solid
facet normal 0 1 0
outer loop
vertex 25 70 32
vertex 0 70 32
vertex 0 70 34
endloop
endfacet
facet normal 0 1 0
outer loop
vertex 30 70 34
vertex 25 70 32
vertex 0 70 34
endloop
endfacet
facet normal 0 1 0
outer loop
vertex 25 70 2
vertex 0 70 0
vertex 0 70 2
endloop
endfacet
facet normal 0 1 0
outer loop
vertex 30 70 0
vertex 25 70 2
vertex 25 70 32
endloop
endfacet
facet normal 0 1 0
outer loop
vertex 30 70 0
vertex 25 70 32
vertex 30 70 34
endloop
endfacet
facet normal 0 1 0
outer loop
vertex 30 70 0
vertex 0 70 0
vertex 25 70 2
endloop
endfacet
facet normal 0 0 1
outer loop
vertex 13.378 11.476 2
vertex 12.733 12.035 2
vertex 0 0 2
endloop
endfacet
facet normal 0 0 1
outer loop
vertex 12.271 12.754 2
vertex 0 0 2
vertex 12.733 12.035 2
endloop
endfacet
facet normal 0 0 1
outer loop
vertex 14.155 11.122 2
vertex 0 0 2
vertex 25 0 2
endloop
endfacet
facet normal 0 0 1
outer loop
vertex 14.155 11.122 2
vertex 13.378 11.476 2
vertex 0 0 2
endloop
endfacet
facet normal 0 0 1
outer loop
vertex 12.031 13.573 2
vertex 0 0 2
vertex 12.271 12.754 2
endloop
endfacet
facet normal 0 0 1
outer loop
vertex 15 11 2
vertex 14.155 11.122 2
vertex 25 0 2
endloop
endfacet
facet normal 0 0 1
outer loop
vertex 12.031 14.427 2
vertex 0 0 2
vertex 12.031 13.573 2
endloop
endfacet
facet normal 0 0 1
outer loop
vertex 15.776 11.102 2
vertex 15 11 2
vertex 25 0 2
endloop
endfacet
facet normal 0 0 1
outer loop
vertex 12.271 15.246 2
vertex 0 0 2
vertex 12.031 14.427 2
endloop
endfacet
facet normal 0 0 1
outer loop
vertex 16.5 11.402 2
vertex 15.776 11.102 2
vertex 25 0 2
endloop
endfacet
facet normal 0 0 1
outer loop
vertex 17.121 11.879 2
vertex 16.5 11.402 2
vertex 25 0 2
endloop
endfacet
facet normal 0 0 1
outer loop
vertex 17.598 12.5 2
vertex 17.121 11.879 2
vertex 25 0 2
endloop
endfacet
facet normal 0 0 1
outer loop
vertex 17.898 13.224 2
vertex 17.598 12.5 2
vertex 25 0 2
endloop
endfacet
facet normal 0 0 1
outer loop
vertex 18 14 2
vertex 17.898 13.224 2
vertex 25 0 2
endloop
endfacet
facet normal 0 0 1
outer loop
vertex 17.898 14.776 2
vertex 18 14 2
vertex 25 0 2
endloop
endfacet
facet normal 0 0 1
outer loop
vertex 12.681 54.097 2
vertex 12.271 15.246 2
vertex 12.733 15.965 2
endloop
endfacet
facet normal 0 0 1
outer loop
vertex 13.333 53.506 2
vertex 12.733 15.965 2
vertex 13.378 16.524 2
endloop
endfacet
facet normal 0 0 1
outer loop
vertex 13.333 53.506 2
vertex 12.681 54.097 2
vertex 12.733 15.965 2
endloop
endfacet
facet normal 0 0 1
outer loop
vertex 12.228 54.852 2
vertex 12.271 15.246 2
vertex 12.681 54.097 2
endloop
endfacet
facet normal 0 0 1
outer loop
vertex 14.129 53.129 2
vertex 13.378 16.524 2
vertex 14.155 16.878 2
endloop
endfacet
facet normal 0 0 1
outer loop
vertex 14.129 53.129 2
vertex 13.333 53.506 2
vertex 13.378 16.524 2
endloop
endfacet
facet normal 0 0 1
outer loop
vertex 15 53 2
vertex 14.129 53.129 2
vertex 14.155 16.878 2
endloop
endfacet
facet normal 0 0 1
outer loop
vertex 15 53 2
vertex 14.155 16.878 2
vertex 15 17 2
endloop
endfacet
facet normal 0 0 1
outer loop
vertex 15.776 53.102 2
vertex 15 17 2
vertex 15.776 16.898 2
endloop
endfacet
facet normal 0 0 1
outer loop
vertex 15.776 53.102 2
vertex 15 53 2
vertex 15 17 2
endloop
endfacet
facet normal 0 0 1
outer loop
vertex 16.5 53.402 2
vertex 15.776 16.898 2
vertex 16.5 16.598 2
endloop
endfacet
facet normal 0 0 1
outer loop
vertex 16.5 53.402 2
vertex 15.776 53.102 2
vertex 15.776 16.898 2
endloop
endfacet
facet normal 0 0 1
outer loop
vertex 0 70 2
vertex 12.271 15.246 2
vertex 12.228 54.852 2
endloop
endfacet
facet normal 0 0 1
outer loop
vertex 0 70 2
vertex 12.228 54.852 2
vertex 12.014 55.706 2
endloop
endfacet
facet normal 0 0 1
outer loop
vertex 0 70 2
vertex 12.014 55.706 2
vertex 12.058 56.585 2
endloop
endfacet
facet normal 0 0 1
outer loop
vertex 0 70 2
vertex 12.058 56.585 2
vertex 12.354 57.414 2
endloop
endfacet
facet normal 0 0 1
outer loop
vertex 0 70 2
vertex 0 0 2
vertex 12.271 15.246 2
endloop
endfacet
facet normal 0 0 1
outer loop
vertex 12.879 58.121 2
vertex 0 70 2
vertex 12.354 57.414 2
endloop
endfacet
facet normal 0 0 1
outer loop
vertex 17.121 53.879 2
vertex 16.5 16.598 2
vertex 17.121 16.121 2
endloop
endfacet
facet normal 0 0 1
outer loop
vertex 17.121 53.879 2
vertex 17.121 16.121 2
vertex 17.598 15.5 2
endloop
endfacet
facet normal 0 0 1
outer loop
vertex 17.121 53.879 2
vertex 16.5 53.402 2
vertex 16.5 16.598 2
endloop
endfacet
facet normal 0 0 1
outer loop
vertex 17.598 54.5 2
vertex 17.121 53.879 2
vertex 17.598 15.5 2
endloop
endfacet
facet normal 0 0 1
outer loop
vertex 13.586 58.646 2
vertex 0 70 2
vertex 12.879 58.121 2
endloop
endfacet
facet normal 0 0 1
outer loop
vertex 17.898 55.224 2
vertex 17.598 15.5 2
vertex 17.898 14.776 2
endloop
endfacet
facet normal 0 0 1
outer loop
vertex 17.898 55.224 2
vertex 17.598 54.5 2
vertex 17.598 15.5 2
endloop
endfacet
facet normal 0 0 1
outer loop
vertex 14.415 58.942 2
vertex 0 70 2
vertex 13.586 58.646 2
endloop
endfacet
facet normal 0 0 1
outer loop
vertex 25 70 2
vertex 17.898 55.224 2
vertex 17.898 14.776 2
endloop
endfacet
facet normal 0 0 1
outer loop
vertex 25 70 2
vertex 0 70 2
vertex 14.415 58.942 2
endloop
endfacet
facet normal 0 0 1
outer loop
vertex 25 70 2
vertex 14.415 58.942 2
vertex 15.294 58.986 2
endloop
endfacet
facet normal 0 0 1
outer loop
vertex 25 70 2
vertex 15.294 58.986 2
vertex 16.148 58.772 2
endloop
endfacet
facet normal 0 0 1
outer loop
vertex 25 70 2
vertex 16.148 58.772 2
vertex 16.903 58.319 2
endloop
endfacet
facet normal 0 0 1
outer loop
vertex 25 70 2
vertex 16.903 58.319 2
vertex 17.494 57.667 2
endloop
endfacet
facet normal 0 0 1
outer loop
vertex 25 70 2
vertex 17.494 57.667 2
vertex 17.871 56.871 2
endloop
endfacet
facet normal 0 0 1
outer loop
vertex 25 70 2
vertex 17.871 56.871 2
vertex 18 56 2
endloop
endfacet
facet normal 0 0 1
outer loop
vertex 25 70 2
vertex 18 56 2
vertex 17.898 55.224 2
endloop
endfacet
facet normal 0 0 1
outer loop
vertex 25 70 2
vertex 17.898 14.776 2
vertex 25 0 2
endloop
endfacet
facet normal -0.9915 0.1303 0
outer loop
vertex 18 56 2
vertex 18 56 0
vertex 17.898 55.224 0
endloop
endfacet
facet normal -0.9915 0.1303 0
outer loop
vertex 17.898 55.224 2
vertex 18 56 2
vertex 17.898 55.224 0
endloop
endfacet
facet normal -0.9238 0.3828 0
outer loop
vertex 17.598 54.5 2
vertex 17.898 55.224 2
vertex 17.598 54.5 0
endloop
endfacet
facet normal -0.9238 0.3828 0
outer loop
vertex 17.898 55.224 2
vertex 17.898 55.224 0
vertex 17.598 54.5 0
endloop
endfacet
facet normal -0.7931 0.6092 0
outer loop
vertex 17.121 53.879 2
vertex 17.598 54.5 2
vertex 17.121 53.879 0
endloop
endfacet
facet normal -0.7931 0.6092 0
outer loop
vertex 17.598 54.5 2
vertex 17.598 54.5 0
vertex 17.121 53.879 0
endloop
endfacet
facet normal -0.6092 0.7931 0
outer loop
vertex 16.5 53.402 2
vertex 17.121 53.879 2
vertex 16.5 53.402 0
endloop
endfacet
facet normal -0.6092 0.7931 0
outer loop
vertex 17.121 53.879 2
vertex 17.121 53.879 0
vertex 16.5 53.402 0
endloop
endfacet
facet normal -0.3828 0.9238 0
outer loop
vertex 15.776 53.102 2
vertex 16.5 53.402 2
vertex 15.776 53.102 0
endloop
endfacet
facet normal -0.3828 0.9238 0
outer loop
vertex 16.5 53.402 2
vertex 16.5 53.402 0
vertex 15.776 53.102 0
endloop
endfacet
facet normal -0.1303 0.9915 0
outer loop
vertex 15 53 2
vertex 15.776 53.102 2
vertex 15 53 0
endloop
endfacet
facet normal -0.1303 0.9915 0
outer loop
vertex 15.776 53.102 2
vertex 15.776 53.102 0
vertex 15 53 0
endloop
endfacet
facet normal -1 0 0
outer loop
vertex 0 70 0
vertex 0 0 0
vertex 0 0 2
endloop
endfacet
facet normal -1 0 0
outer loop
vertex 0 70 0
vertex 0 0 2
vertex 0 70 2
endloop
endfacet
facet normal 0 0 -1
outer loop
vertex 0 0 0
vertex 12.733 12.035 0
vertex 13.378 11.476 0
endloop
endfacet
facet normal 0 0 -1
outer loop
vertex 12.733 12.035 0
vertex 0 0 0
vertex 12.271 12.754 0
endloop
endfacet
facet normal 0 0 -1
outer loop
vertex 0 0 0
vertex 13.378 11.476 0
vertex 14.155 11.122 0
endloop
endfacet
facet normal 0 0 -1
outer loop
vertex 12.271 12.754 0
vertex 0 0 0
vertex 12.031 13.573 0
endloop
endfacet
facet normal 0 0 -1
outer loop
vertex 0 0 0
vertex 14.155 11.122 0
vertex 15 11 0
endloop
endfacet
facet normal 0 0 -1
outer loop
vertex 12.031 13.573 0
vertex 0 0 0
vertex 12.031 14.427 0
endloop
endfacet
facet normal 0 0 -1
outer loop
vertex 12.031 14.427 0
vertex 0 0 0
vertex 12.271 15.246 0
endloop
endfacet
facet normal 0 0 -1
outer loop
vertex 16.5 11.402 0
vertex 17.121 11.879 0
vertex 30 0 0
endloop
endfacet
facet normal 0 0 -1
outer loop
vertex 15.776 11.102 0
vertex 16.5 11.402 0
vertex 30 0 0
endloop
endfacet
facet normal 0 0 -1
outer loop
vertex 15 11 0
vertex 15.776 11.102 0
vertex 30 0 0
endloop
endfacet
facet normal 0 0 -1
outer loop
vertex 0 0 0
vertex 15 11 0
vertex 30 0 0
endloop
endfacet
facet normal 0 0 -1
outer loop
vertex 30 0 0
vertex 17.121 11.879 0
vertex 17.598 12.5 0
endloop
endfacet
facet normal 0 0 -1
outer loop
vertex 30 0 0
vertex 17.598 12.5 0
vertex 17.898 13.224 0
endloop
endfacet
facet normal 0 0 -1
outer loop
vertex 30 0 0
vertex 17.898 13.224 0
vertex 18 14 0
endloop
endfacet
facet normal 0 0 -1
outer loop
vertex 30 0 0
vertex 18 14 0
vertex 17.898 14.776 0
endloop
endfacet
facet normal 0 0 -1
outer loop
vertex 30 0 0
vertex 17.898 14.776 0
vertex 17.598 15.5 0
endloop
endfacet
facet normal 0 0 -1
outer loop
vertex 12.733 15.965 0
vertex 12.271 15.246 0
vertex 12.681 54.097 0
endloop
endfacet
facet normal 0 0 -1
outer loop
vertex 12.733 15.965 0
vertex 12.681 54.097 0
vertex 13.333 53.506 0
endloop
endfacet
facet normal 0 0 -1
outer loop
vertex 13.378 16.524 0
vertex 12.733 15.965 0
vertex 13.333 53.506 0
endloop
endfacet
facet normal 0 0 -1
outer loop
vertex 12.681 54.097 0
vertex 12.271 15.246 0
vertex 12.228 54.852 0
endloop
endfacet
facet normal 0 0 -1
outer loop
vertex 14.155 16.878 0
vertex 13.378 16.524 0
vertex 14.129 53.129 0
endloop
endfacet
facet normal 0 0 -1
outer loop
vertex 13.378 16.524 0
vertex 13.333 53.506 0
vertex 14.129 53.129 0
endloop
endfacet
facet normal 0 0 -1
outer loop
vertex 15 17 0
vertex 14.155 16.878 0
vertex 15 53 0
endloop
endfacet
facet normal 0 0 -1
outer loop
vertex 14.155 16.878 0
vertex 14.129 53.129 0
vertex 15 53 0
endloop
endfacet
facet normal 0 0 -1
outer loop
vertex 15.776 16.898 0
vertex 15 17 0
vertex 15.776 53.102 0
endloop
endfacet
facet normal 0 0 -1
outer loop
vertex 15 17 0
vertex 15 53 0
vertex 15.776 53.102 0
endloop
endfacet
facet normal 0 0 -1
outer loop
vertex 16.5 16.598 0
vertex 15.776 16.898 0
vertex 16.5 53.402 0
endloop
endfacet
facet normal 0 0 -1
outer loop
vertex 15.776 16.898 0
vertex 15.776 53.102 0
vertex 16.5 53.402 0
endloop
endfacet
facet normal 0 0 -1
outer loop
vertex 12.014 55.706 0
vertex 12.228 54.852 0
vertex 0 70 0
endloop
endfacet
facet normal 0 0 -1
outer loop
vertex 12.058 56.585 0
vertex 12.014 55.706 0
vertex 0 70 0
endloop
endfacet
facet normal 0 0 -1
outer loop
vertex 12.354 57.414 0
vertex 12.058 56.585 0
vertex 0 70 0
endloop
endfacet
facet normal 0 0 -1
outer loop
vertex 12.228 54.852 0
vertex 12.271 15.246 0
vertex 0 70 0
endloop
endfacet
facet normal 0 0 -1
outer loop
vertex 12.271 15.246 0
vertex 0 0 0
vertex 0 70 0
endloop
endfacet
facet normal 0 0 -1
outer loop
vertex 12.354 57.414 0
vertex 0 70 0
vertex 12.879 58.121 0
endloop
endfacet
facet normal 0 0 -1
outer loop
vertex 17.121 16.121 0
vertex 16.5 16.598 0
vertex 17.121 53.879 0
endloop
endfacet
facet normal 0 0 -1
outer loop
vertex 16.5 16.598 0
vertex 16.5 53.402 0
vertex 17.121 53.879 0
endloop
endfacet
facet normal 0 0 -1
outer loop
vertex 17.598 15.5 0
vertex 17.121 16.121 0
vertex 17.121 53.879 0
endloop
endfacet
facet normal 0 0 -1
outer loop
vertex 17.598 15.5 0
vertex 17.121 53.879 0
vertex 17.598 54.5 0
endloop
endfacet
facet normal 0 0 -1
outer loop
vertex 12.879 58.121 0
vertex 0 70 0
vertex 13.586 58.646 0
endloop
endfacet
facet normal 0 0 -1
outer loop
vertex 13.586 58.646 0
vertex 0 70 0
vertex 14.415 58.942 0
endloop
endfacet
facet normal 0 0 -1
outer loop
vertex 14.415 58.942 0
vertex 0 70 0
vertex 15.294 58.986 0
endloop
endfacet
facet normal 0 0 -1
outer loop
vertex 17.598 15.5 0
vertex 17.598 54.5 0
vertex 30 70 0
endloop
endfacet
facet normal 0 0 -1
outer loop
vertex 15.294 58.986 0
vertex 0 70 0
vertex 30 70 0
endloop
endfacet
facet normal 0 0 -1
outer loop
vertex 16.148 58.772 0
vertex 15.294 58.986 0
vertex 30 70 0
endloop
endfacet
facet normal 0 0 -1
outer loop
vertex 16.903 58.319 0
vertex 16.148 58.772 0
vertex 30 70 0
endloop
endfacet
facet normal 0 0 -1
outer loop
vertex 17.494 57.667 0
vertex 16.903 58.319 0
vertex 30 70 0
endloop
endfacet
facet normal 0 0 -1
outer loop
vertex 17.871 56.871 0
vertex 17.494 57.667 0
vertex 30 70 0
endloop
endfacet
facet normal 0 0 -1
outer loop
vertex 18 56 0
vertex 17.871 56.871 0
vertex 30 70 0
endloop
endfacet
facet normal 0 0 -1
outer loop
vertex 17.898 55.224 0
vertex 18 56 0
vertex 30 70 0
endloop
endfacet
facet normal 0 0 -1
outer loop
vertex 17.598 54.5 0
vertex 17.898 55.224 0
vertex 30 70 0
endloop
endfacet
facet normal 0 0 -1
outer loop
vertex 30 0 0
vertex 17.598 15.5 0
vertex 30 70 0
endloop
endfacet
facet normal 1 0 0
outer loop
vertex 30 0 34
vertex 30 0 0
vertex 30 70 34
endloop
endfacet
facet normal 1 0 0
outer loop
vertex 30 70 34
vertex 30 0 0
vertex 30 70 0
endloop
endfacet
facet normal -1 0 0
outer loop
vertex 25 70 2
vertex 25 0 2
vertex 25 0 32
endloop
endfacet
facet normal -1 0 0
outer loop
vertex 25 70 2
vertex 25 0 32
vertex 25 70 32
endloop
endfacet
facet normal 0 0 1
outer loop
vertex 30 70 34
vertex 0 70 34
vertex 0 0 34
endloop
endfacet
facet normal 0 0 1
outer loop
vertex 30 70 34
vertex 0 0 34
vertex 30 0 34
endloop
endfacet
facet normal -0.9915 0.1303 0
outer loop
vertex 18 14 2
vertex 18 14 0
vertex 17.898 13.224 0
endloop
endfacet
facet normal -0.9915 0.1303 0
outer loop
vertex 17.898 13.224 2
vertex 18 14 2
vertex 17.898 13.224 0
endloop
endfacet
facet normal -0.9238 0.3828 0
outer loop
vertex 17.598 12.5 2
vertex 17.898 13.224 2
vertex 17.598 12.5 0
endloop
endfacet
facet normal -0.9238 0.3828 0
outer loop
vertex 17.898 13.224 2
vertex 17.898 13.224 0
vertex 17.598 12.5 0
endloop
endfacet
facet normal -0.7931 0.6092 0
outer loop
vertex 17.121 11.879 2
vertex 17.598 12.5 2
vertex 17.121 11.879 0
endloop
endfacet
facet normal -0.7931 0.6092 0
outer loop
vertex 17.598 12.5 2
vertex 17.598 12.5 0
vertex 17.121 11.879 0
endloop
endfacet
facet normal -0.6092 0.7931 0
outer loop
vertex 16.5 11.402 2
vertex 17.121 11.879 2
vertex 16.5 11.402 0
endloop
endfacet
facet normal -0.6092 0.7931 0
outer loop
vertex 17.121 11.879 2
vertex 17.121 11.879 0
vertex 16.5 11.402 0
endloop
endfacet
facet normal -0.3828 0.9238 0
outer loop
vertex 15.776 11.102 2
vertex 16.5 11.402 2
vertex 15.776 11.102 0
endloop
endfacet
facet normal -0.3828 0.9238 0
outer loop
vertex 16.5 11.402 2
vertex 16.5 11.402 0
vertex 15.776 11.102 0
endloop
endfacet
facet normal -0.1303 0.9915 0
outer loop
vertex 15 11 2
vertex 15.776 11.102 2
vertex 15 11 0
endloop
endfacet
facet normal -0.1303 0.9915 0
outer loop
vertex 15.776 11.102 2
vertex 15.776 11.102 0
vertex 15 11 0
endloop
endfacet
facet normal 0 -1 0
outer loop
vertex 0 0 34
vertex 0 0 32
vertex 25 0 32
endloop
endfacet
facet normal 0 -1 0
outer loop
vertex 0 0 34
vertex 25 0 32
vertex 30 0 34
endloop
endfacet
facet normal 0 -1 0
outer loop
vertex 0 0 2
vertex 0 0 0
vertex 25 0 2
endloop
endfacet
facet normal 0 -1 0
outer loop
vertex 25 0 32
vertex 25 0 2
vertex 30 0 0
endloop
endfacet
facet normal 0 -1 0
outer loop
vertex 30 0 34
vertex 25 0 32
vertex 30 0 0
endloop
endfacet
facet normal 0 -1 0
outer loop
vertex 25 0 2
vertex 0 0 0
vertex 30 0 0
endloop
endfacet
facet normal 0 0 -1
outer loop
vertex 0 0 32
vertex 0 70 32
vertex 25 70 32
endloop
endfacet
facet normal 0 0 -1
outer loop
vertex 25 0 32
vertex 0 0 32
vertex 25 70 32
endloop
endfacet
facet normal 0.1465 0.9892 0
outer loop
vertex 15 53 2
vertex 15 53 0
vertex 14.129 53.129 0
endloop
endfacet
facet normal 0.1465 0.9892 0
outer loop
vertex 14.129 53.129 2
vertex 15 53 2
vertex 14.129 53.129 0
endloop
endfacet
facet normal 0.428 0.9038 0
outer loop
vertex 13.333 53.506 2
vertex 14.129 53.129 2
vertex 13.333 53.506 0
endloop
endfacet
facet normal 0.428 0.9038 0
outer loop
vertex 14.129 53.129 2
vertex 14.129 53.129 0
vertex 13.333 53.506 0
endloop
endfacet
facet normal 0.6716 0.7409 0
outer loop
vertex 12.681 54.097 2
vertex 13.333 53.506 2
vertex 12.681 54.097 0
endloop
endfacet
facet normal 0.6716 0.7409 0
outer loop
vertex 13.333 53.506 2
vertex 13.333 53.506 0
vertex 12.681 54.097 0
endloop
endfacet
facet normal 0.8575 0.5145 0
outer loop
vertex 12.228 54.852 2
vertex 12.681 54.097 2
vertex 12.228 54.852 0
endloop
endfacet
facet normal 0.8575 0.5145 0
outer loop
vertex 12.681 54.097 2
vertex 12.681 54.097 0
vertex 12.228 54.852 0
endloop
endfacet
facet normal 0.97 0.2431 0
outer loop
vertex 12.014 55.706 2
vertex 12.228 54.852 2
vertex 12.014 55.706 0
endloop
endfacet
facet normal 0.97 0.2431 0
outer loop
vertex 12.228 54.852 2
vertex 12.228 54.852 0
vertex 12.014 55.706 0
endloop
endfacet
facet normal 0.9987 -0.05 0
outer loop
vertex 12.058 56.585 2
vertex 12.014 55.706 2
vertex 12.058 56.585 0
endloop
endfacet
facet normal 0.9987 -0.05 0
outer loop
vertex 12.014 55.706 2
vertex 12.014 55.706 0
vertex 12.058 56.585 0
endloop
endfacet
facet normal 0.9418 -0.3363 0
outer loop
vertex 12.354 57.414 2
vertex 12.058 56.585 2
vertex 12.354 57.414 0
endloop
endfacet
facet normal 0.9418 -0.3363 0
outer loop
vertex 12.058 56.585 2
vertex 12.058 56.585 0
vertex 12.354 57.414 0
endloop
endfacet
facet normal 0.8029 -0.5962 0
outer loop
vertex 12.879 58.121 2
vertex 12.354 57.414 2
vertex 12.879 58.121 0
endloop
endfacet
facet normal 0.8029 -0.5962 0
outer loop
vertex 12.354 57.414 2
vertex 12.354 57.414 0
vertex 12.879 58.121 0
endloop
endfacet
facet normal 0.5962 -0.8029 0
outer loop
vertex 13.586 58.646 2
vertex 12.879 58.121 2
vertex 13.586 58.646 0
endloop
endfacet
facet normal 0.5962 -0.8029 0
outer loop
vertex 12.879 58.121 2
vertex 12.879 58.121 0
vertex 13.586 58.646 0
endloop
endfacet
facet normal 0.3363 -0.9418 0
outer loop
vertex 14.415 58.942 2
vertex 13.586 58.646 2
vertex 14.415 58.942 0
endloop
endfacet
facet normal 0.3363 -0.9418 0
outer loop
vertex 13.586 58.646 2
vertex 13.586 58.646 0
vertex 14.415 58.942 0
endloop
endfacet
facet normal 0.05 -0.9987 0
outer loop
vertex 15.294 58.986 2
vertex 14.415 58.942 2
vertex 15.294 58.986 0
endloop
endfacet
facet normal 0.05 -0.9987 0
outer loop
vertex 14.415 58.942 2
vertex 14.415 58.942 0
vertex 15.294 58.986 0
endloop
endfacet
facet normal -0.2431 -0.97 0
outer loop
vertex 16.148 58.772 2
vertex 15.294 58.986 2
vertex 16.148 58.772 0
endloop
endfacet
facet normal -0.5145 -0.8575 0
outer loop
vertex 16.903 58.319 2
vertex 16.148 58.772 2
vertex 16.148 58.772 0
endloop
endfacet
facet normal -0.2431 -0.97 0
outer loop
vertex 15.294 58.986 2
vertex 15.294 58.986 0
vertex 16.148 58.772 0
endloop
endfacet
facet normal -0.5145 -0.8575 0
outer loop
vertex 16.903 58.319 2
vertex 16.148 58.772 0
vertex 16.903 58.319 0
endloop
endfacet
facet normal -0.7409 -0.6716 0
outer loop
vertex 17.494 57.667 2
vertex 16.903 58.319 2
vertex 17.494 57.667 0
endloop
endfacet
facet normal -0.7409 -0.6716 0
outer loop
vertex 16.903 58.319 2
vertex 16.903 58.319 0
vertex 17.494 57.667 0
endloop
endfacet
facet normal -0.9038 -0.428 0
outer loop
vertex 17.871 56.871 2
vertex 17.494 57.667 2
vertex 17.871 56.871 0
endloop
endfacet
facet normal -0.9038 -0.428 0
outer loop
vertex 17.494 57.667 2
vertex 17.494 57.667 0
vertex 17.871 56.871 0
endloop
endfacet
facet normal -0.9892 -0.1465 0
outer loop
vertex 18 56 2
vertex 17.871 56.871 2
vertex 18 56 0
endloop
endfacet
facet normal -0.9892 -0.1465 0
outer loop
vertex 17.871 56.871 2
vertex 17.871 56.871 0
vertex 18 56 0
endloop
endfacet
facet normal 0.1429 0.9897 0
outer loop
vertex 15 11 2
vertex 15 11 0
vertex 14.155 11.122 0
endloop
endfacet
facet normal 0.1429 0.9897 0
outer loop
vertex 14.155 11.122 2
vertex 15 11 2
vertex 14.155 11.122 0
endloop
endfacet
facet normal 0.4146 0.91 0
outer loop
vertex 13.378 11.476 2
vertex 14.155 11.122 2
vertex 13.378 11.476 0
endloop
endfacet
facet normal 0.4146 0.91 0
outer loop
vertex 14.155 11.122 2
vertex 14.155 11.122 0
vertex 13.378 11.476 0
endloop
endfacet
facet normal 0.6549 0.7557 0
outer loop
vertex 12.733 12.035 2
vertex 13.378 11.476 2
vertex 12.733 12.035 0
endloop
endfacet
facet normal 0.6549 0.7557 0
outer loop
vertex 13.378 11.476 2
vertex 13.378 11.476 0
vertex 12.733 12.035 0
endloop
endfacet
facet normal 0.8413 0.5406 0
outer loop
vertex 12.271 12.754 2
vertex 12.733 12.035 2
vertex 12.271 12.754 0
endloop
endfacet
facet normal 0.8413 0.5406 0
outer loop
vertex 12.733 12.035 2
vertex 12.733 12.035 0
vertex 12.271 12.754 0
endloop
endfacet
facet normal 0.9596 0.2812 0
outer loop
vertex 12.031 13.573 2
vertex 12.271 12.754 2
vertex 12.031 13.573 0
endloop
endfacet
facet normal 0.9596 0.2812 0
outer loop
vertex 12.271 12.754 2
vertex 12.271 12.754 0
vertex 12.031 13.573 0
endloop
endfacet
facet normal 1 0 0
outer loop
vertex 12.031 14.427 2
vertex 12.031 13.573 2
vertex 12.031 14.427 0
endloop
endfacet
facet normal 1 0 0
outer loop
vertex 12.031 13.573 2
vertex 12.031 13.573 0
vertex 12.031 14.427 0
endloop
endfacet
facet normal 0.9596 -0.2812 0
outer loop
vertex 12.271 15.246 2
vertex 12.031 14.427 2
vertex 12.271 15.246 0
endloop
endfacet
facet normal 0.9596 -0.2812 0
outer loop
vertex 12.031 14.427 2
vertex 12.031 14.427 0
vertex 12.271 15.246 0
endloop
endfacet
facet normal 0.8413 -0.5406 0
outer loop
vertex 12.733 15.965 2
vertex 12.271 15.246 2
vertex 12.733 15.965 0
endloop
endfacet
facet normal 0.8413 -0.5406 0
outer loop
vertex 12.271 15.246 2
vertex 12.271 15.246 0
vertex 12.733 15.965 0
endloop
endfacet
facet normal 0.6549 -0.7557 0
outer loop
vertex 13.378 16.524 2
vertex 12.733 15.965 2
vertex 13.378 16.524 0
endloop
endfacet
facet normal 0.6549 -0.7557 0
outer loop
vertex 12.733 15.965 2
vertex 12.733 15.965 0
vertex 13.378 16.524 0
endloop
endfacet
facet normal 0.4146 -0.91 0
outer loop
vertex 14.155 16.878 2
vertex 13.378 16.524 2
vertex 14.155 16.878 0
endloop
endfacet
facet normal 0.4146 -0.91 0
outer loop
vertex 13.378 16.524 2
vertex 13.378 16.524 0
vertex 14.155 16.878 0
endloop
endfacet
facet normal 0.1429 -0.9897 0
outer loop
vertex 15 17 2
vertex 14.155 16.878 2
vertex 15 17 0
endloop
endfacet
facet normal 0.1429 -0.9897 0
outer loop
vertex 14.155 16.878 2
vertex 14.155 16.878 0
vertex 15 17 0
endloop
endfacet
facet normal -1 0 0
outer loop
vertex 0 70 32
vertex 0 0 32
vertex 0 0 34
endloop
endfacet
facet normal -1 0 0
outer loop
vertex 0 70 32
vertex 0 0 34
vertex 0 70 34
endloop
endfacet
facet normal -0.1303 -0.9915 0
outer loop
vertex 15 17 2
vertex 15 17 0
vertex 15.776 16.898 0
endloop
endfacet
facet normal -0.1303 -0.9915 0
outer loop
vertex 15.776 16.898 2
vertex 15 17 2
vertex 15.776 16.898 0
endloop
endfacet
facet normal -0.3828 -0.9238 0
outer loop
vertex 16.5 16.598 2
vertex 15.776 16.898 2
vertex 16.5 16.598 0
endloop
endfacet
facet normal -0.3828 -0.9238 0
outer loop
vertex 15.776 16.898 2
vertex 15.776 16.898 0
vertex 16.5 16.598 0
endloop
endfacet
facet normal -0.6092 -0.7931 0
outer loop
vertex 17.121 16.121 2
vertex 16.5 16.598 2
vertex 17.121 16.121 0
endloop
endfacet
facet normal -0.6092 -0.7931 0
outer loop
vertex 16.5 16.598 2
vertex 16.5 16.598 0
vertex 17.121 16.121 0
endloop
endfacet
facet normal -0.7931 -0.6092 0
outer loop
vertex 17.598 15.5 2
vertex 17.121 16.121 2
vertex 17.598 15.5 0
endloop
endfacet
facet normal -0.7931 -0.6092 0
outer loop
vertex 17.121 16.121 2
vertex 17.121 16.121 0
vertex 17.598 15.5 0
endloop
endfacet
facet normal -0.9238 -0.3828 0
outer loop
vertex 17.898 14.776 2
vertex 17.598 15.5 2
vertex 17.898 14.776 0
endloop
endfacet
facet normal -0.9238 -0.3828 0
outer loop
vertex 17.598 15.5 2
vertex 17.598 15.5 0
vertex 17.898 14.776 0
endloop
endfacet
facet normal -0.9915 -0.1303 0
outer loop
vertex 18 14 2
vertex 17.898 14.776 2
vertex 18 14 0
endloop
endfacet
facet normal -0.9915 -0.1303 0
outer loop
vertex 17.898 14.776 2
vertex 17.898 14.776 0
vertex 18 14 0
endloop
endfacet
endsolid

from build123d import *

# Parameters (mm, degrees)
F0_W     = 30
F0_H     = 70
F1_DEPTH = 2
F2_W     = 5
F2_H     = 70
F3_DEPTH = 30
F4_W     = 30
F4_H     = 70
F5_DEPTH = 2
F7_DEPTH = 5


with BuildPart() as f1:
    # F0 (on Top) → F1 (new body)
    with BuildSketch(Plane.XY):
        with Locations((15, 35)):
            Rectangle(F0_W, F0_H)
    extrude(amount=F1_DEPTH)

    # F2 (on face) → F3 (join)
    with BuildSketch(Plane.XY.offset(2)):
        with Locations((27.5, 35)):
            Rectangle(F2_W, F2_H)
    extrude(amount=F3_DEPTH)

    # F4 (on face) → F5 (join)
    with BuildSketch(Plane.XY.offset(32)):
        with Locations((15, 35)):
            Rectangle(F4_W, F4_H)
    extrude(amount=F5_DEPTH)

    # F6 (on face) → F7 (cut)
    with BuildSketch(Plane(origin=(0, 0, 0), x_dir=(1, 0, 0), z_dir=(0, 0, -1))):
        with BuildLine():
            ThreePointArc((18, -14), (17.12132, -11.87868), (15, -11))
            Line((15, -11), (15, -14))
            Line((15, -14), (15, -17))
            ThreePointArc((15, -17), (17.12132, -16.12132), (18, -14))
        make_face()
        with BuildLine():
            ThreePointArc((18, -56), (17.12132, -53.87868), (15, -53))
            ThreePointArc((15, -53), (12.87868, -58.12132), (18, -56))
        make_face()
        with BuildLine():
            Line((15, -14), (15, -11))
            ThreePointArc((15, -11), (12, -14), (15, -17))
            Line((15, -17), (15, -14))
        make_face()
    extrude(amount=-F7_DEPTH, mode=Mode.SUBTRACT)


solid = f1.part
